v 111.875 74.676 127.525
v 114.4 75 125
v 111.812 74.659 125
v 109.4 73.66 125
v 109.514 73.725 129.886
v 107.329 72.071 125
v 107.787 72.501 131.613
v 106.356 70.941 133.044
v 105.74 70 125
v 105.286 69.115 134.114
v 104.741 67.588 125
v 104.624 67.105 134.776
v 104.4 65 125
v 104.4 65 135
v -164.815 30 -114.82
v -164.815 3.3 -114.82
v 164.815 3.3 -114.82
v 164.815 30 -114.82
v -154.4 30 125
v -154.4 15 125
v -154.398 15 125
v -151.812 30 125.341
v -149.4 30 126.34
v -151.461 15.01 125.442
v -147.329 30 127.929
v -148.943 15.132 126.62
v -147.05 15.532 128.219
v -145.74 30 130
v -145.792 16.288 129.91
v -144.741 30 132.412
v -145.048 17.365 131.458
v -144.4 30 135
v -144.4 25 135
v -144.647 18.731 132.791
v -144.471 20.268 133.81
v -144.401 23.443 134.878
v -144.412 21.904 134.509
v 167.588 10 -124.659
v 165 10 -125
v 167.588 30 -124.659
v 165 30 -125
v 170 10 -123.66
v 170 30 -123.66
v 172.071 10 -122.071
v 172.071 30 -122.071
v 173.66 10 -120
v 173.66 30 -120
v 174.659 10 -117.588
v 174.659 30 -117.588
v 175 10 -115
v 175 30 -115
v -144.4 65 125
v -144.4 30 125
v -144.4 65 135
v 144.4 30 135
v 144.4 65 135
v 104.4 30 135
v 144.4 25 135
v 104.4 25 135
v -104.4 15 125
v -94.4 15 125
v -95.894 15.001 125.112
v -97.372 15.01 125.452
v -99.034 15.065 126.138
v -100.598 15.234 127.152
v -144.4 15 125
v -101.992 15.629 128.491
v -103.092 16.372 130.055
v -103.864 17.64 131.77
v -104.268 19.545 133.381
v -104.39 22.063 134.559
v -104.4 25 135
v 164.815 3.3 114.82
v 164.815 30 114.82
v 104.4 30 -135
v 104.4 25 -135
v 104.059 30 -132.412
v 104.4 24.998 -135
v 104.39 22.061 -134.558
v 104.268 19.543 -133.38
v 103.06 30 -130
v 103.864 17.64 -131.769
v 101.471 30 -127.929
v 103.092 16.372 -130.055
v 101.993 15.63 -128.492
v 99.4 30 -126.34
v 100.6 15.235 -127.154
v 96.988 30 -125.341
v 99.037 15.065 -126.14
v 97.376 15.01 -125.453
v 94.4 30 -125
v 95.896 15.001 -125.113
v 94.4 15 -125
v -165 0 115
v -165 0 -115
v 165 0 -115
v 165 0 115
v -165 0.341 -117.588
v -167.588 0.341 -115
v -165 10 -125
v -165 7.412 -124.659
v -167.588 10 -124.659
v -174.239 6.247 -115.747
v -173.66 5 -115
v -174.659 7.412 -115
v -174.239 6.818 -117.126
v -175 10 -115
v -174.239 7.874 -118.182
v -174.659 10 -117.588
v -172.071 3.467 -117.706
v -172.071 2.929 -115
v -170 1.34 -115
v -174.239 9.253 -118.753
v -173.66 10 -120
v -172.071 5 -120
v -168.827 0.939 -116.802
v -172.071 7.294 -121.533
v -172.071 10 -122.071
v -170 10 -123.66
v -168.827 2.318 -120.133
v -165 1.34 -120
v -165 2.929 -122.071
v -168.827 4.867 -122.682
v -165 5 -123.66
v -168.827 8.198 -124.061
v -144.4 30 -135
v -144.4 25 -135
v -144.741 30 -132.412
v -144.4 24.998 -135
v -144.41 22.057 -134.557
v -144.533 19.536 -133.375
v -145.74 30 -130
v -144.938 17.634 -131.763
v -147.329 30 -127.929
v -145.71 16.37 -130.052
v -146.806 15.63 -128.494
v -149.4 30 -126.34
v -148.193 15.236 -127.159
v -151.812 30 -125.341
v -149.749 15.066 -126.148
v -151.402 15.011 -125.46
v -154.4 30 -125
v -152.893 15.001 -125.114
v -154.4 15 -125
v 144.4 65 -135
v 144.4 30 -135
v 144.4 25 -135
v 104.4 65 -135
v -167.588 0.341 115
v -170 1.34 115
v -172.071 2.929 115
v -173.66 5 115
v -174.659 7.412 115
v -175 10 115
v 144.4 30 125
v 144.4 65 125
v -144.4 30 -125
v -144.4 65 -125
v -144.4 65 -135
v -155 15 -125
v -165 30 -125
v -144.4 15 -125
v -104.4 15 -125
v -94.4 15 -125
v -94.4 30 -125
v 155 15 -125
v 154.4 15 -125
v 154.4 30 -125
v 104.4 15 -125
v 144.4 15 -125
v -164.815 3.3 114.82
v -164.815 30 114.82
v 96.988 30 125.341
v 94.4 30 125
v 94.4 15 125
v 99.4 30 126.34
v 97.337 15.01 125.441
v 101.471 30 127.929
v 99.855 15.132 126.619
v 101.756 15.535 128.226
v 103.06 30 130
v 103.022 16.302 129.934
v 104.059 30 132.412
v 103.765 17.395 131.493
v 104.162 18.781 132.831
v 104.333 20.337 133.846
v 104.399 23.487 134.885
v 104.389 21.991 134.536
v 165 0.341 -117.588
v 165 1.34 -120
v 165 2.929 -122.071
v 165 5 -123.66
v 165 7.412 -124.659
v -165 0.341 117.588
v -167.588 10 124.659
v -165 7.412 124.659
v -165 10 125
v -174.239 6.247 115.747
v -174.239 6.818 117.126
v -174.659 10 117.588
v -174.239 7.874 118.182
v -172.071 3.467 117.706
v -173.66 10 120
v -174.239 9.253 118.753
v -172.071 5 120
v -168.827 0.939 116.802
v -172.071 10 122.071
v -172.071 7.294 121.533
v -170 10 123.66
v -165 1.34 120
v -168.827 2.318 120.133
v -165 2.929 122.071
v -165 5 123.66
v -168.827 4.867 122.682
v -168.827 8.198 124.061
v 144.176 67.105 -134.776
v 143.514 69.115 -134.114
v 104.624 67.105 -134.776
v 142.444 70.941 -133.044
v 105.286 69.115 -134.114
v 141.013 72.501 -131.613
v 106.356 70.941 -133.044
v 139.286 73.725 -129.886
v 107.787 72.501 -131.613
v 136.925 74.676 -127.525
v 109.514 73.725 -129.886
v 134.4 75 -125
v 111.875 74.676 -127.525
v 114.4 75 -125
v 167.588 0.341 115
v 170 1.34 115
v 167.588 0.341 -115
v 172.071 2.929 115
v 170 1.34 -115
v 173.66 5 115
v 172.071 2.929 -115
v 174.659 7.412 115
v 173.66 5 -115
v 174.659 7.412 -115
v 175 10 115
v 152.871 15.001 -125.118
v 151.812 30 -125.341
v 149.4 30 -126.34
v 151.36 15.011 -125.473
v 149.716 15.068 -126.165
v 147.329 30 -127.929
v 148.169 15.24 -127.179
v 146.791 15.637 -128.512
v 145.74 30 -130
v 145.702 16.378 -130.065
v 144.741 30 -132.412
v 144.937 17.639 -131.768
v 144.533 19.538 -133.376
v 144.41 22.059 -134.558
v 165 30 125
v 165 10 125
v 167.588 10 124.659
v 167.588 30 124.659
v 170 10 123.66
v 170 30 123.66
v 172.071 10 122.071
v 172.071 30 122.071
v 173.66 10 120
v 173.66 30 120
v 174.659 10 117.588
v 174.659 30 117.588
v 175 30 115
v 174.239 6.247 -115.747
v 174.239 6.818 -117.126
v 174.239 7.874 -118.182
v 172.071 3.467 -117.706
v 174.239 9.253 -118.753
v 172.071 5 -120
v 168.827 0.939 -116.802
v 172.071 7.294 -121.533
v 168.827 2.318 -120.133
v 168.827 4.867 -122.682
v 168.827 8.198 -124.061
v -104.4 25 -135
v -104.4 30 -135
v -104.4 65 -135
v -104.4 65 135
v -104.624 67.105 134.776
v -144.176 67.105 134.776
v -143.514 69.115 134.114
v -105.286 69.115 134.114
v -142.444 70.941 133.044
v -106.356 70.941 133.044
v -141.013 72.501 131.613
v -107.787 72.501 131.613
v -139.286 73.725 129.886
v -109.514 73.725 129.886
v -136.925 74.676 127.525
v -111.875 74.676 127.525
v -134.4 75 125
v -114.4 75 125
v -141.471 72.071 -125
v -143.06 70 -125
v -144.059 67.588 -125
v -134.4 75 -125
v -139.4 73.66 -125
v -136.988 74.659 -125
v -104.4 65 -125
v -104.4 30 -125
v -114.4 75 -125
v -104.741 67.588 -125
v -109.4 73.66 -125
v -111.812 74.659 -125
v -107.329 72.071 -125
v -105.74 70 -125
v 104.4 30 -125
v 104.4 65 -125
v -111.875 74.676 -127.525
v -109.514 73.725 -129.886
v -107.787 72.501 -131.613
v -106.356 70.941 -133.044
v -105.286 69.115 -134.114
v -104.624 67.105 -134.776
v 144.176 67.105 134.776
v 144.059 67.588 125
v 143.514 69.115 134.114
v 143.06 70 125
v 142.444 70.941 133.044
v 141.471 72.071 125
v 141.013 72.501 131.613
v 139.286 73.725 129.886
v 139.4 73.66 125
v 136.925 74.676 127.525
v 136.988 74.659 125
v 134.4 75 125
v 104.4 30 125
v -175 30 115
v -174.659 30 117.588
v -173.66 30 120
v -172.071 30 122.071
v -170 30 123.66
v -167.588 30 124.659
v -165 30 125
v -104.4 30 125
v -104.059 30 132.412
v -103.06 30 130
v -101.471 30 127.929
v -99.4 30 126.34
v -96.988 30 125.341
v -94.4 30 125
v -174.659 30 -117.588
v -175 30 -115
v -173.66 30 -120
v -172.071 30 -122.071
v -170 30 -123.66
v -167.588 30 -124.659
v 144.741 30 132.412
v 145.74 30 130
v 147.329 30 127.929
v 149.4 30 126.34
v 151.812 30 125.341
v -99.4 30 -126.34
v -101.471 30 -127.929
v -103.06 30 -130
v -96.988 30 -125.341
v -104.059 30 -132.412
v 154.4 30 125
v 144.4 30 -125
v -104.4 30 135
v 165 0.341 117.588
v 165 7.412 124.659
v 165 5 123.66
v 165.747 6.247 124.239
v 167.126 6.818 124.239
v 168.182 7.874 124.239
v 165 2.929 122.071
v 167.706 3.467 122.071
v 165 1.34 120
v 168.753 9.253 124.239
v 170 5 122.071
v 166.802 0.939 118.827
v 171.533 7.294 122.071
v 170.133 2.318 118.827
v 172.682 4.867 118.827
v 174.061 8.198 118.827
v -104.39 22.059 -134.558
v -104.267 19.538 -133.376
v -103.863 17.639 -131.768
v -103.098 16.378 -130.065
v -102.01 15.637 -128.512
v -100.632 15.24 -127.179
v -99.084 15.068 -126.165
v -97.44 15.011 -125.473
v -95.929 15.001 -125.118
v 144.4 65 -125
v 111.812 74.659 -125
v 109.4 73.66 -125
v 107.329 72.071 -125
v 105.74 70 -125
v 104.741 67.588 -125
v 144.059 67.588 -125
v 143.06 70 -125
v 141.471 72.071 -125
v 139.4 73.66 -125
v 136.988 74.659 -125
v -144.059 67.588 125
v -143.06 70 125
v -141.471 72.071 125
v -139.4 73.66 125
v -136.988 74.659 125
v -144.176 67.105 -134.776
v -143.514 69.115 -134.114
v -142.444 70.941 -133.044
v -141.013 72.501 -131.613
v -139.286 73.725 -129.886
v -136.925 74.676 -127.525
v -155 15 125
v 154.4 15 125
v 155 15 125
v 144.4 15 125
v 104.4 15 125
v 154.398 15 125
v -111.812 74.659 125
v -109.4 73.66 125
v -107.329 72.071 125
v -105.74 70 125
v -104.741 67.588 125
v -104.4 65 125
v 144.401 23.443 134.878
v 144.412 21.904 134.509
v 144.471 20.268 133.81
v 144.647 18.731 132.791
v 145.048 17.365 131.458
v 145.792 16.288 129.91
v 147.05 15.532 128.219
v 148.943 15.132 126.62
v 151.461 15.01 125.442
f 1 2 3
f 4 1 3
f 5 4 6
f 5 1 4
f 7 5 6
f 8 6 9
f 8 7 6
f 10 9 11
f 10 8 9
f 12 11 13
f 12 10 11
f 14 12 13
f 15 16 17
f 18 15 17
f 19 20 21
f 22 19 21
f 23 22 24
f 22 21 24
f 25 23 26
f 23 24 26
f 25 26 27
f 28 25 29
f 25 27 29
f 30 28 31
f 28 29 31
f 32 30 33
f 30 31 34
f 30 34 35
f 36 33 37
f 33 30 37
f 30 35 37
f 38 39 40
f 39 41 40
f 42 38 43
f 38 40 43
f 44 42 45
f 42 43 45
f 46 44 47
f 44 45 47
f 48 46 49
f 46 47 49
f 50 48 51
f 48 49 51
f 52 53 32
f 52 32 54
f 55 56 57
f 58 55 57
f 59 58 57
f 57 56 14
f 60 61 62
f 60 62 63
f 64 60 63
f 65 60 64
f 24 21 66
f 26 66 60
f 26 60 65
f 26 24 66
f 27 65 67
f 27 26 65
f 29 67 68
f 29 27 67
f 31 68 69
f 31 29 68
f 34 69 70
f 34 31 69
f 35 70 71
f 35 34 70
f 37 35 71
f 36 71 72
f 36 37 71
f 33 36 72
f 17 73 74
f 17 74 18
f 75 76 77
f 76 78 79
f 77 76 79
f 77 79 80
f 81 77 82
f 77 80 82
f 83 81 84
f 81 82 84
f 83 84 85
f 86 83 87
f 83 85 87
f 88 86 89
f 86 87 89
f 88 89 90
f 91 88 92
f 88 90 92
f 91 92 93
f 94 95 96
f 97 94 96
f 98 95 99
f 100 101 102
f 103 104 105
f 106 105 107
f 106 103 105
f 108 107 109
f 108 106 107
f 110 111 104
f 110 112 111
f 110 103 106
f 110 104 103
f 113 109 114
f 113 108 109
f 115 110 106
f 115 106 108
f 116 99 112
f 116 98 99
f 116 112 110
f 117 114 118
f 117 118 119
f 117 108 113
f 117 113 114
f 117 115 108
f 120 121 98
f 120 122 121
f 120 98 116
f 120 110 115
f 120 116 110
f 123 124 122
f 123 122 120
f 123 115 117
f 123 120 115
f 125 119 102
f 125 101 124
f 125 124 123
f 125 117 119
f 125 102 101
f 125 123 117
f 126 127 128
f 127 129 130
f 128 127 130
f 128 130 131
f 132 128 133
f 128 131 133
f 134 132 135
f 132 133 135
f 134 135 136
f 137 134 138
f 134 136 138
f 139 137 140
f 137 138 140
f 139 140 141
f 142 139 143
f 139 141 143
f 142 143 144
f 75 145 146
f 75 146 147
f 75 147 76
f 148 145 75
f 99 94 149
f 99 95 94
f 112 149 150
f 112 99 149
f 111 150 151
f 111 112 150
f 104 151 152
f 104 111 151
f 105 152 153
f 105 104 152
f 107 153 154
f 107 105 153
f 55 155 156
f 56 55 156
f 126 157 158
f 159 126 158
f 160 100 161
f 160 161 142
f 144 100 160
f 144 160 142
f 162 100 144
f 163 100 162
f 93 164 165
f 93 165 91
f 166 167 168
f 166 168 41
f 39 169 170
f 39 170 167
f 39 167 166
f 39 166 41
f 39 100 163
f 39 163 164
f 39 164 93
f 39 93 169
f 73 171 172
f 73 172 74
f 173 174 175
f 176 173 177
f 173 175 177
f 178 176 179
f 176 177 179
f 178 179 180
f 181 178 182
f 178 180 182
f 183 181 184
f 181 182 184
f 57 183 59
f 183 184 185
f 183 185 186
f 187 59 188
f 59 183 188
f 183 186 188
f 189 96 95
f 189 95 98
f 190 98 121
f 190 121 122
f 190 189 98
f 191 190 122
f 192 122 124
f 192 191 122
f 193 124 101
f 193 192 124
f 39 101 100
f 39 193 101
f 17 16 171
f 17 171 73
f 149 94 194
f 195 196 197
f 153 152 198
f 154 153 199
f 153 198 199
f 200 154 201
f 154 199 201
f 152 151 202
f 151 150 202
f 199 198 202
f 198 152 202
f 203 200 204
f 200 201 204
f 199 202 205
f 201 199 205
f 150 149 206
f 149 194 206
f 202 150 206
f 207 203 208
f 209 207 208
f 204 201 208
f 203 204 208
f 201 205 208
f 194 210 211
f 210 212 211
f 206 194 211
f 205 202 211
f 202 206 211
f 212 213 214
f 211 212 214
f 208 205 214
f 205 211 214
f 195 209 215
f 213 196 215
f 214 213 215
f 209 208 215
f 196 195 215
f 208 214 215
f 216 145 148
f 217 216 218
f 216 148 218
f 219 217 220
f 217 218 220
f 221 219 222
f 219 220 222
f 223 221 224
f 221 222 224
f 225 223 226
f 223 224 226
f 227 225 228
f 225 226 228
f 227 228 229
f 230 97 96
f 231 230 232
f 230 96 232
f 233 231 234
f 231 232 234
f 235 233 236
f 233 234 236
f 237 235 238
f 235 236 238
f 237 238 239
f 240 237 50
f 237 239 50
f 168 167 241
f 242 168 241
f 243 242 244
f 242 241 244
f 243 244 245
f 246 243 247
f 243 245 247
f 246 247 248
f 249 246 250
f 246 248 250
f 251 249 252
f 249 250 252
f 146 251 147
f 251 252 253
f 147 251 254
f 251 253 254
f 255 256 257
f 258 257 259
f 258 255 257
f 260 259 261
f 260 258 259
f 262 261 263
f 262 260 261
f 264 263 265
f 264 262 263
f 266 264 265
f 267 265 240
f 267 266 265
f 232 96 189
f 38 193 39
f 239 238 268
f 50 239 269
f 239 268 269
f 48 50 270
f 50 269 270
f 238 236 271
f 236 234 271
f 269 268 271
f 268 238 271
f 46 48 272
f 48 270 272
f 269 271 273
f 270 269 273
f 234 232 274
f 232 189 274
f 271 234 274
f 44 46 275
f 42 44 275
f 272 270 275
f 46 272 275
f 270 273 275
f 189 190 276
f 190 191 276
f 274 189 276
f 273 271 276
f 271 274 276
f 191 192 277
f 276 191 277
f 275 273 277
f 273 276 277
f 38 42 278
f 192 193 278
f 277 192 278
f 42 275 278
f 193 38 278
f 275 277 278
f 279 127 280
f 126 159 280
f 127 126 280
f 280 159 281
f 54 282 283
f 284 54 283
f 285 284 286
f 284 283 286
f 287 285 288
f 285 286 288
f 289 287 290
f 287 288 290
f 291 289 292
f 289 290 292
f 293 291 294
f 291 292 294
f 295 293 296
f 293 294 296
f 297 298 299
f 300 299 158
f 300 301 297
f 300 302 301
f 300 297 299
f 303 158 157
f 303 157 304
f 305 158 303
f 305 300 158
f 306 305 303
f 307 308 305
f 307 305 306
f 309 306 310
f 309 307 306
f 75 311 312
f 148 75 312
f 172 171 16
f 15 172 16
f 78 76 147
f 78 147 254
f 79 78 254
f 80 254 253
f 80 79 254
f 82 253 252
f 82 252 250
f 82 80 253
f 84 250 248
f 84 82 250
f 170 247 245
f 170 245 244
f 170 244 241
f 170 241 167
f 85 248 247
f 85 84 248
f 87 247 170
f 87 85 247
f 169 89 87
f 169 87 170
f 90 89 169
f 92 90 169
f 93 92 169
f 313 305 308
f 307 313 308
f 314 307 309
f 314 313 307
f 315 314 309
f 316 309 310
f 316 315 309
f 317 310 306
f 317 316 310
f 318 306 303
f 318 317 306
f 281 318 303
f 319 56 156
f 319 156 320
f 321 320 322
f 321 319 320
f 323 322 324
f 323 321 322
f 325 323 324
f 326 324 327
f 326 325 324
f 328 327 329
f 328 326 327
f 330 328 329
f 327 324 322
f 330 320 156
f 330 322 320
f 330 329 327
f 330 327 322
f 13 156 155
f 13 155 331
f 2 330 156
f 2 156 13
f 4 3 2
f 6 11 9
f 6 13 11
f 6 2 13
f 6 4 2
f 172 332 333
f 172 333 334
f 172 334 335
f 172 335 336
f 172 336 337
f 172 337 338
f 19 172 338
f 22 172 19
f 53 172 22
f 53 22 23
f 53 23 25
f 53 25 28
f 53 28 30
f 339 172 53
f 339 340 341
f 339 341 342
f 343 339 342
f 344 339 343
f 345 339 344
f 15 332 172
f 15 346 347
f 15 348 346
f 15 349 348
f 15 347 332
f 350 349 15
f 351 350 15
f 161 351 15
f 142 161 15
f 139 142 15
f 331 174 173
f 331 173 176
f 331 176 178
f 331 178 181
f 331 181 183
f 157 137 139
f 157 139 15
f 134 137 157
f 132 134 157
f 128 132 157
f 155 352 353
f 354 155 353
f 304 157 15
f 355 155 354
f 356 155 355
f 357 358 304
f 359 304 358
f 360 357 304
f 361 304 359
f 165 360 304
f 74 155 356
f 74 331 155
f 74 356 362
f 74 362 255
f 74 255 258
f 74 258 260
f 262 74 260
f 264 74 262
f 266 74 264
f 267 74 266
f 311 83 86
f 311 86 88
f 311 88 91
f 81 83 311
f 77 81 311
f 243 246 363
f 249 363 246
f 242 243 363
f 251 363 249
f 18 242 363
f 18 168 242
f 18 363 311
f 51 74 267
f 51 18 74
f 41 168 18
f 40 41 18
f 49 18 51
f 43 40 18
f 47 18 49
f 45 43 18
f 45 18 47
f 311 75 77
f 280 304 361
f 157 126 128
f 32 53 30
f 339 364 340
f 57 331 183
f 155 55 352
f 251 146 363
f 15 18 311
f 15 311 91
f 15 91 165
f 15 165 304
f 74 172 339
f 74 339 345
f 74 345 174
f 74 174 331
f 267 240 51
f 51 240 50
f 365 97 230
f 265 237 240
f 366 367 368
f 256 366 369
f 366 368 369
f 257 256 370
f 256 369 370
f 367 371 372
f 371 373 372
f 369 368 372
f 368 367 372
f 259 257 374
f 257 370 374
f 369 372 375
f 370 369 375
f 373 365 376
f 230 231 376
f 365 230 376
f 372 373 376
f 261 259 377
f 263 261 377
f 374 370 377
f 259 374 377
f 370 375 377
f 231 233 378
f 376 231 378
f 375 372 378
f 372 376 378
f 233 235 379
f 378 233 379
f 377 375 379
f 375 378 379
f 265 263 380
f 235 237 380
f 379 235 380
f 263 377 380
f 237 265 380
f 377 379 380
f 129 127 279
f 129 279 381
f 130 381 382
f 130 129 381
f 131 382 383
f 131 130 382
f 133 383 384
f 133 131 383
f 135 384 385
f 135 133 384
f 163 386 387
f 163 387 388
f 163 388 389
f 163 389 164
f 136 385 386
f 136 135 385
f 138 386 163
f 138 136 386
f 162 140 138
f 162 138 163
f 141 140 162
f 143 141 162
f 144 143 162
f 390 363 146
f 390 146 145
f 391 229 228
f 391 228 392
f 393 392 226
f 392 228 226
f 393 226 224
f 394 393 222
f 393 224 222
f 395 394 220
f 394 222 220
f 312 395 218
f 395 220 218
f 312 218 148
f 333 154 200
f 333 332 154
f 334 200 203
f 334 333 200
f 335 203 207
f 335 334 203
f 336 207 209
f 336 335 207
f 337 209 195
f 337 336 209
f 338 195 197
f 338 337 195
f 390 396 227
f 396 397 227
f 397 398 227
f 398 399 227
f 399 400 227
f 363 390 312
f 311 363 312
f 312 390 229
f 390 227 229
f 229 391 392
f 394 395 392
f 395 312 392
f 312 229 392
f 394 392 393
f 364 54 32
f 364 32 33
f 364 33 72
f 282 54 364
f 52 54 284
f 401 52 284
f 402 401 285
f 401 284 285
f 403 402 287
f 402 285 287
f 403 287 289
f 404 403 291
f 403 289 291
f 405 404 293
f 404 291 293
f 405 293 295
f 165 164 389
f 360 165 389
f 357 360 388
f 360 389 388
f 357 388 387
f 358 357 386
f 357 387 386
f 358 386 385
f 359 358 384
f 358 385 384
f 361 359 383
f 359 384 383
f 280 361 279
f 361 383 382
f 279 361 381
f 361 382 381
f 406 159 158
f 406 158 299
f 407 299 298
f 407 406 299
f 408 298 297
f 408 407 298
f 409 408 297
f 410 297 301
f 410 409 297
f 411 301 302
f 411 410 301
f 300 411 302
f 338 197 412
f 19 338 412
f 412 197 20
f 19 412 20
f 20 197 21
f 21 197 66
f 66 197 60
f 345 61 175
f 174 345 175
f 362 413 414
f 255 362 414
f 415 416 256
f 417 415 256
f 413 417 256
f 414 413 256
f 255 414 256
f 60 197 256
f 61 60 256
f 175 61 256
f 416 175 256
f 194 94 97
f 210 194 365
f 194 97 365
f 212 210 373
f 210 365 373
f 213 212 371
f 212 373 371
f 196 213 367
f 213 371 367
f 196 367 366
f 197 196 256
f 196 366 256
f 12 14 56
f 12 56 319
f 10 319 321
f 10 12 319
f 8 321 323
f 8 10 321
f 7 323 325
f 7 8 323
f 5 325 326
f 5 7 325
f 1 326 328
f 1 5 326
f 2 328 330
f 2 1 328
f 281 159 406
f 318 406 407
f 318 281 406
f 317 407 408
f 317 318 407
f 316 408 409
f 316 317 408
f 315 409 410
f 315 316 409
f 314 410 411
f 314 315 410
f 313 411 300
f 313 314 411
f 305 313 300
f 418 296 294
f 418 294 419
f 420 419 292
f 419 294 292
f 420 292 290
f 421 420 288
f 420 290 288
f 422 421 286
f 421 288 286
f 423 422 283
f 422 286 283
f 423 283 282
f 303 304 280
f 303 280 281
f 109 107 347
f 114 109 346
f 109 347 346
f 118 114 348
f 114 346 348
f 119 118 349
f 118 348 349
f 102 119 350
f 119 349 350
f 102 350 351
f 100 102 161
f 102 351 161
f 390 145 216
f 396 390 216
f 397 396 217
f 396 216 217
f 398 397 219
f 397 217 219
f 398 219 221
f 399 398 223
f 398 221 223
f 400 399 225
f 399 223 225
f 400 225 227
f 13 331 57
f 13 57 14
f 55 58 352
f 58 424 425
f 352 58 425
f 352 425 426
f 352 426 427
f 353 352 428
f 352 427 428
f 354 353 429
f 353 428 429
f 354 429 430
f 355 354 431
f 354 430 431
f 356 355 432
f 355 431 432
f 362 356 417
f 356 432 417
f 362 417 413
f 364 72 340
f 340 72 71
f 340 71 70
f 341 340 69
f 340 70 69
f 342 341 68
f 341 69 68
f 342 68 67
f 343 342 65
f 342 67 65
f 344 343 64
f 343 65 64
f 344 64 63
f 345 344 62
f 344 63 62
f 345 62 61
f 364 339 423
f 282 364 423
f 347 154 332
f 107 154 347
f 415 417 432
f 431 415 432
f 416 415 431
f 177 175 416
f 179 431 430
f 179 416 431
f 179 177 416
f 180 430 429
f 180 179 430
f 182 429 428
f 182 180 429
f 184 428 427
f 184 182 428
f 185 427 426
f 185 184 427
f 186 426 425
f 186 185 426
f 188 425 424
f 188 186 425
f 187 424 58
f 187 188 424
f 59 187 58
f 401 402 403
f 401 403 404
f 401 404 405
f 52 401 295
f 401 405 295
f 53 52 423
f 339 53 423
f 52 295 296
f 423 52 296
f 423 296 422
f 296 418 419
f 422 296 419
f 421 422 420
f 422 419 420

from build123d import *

# Parameters (mm, degrees)
SKETCH1_W            = 350
SKETCH1_H            = 250
SKETCH1_W_2          = 329.63
SKETCH1_H_2          = 229.64
BOSS_EXTRUDE2_DEPTH  = 30
SKETCH1_3_W          = 329.63
SKETCH1_3_H          = 229.64
BOSS_EXTRUDE3_DEPTH  = 3.3
FILLET1_R            = 10
SKETCH3_W            = 40
SKETCH3_H            = 60
BOSS_EXTRUDE4_DEPTH  = 10
FILLET3_R            = 10
FILLET4_R            = 10
FILLET3_OF_MIRROR3_R = 10
FILLET4_OF_MIRROR3_R = 10
FILLET5_START        = 25.0000001
FILLET5_DEPTH        = 4.9999999
FILLET5_START_2      = 14.9999999
FILLET5_2_DEPTH      = 10.0000002
FILLET5_START_3      = -155
FILLET5_3_DEPTH      = 310


with BuildPart() as part:
    # Sketch1 → Boss-Extrude2 (new body)
    with BuildSketch(Plane(origin=(0, 0, 0), x_dir=(1, 0, 0), z_dir=(0, 1, 0))):
        Rectangle(SKETCH1_W, SKETCH1_H)
        Rectangle(SKETCH1_W_2, SKETCH1_H_2, mode=Mode.SUBTRACT)
    extrude(amount=BOSS_EXTRUDE2_DEPTH)

    # Sketch1<3> → Boss-Extrude3 (add)
    with BuildSketch(Plane(origin=(0, 0, 0), x_dir=(1, 0, 0), z_dir=(0, 1, 0))):
        Rectangle(SKETCH1_3_W, SKETCH1_3_H)
    extrude(amount=BOSS_EXTRUDE3_DEPTH)

    # Fillet1
    fillet1_edges = [part.edges().sort_by_distance(p)[0] for p in [
        (0, 0, -125),
        (175, 0, 0),
        (0, 0, 125),
        (-175, 0, 0),
        (-175, 15, -125),
        (175, 15, -125),
        (175, 15, 125),
        (-175, 15, 125),
    ]]
    fillet(fillet1_edges, radius=FILLET1_R)

    # Sketch3 → Boss-Extrude4 (add)
    with BuildSketch(Plane.XY.offset(125)):
        with Locations((-124.4, 45)):
            Rectangle(SKETCH3_W, SKETCH3_H)
    boss_extrude4 = extrude(amount=BOSS_EXTRUDE4_DEPTH)

    # Fillet3
    fillet3_edges = [part.edges().sort_by_distance(p)[0] for p in [
        (-124.4, 15, 135),
    ]]
    fillet(fillet3_edges, radius=FILLET3_R - 0.0001)  # a hair under: the kernel refuses the full size

    # Fillet4
    fillet4_edges = [part.edges().sort_by_distance(p)[0] for p in [
        (-124.4, 75, 135),
        (-104.4, 75, 130),
        (-144.4, 75, 130),
    ]]
    fillet(fillet4_edges, radius=FILLET4_R - 0.0001)  # a hair under: the kernel refuses the full size

    # Mirror3: Boss-Extrude4 across plane
    add(boss_extrude4.mirror(Plane.XY))

    # Fillet3 of Mirror3
    fillet3_of_mirror3_edges = [part.edges().sort_by_distance(p)[0] for p in [
        (-124.4, 15, -135),
    ]]
    fillet(fillet3_of_mirror3_edges, radius=FILLET3_OF_MIRROR3_R - 0.0001)  # a hair under: the kernel refuses the full size

    # Fillet4 of Mirror3
    fillet4_of_mirror3_edges = [part.edges().sort_by_distance(p)[0] for p in [
        (-124.4, 75, -135),
        (-104.4, 75, -130),
        (-144.4, 75, -130),
    ]]
    fillet(fillet4_of_mirror3_edges, radius=FILLET4_OF_MIRROR3_R - 0.0001)  # a hair under: the kernel refuses the full size

    # Mirror4: read off the stored shape, not the designer's step
    # Mirror4: part across plane


with BuildPart() as part_1:
    add(part.part)
    add(part.part.mirror(Plane(origin=(0, 0, 0), x_dir=(0, 0, 1), z_dir=(1, 0, 0))))

    # Fillet5: read off the stored shape, not the designer's step
    # Fillet5 outline → Fillet5 (add)
    with BuildSketch(Plane(origin=(0, 0, 0), x_dir=(1, 0, 0), z_dir=(0, 1, 0)).offset(FILLET5_START)):
        with BuildLine():
            Line((104.4, 125), (104.4, 135))
            ThreePointArc((104.4, 135), (101.471067812, 127.928932188), (94.4, 125))
            Line((94.4, 125), (104.4, 125))
        make_face()
        with BuildLine():
            Line((144.4, 135), (144.4, 125))
            Line((144.4, 125), (154.4, 125))
            ThreePointArc((154.4, 125), (147.328932188, 127.928932188), (144.4, 135))
        make_face()
        with BuildLine():
            Line((-154.4, 125), (-144.4, 125))
            Line((-144.4, 125), (-144.4, 135))
            ThreePointArc((-144.4, 135), (-147.328932188, 127.928932188), (-154.4, 125))
        make_face()
        with BuildLine():
            Line((-104.4, 125), (-94.4, 125))
            ThreePointArc((-94.4, 125), (-101.471067812, 127.928932188), (-104.4, 135))
            Line((-104.4, 135), (-104.4, 125))
        make_face()
        with BuildLine():
            Line((-144.4, -135), (-144.4, -125))
            Line((-144.4, -125), (-154.4, -125))
            ThreePointArc((-154.4, -125), (-147.328932188, -127.928932188), (-144.4, -135))
        make_face()
        with BuildLine():
            ThreePointArc((-104.4, -135), (-101.471067812, -127.928932188), (-94.4, -125))
            Line((-94.4, -125), (-104.4, -125))
            Line((-104.4, -125), (-104.4, -135))
        make_face()
        with BuildLine():
            Line((154.4, -125), (144.4, -125))
            Line((144.4, -125), (144.4, -135))
            ThreePointArc((144.4, -135), (147.328932188, -127.928932188), (154.4, -125))
        make_face()
        with BuildLine():
            ThreePointArc((94.4, -125), (101.471067812, -127.928932188), (104.4, -135))
            Line((104.4, -135), (104.4, -125))
            Line((104.4, -125), (94.4, -125))
        make_face()
    extrude(amount=FILLET5_DEPTH)

    # Fillet5 2 outline → Fillet5 2 (add)
    with BuildSketch(Plane(origin=(0, 0, 0), x_dir=(1, 0, 0), z_dir=(0, 1, 0)).offset(FILLET5_START_2)):
        with BuildLine():
            Line((104.4, 125), (104.4, 135))
            ThreePointArc((104.4, 135), (101.471067812, 127.928932188), (94.4, 125))
            Line((94.4, 125), (104.4, 125))
        make_face()
        with BuildLine():
            Line((144.4, 135), (144.4, 125))
            Line((144.4, 125), (154.4, 125))
            ThreePointArc((154.4, 125), (147.328932188, 127.928932188), (144.4, 135))
        make_face()
        with BuildLine():
            Line((-154.4, 125), (-144.4, 125))
            Line((-144.4, 125), (-144.4, 135))
            ThreePointArc((-144.4, 135), (-147.328932188, 127.928932188), (-154.4, 125))
        make_face()
        with BuildLine():
            Line((-104.4, 125), (-94.4, 125))
            ThreePointArc((-94.4, 125), (-101.471067812, 127.928932188), (-104.4, 135))
            Line((-104.4, 135), (-104.4, 125))
        make_face()
        with BuildLine():
            Line((-144.4, -135), (-144.4, -125))
            Line((-144.4, -125), (-154.4, -125))
            ThreePointArc((-154.4, -125), (-147.328932188, -127.928932188), (-144.4, -135))
        make_face()
        with BuildLine():
            ThreePointArc((-104.4, -135), (-101.471067812, -127.928932188), (-94.4, -125))
            Line((-94.4, -125), (-104.4, -125))
            Line((-104.4, -125), (-104.4, -135))
        make_face()
        with BuildLine():
            Line((154.4, -125), (144.4, -125))
            Line((144.4, -125), (144.4, -135))
            ThreePointArc((144.4, -135), (147.328932188, -127.928932188), (154.4, -125))
        make_face()
        with BuildLine():
            ThreePointArc((94.4, -125), (101.471067812, -127.928932188), (104.4, -135))
            Line((104.4, -135), (104.4, -125))
            Line((104.4, -125), (94.4, -125))
        make_face()
    extrude(amount=FILLET5_2_DEPTH)

    # Fillet5 3 outline → Fillet5 3 (cut)
    with BuildSketch(Plane.YZ.offset(FILLET5_START_3)):
        with BuildLine():
            Line((25, 135), (14.9999999, 135))
            Line((14.9999999, 135), (15, 125))
            ThreePointArc((15, 125), (17.928932188, 132.071067812), (25, 135))
        make_face()
        with BuildLine():
            ThreePointArc((25, -135), (17.928932188, -132.071067812), (15, -125))
            Line((15, -125), (14.9999999, -135))
            Line((14.9999999, -135), (25, -135))
        make_face()
    extrude(amount=FILLET5_3_DEPTH, mode=Mode.SUBTRACT)


solid = part_1.part
